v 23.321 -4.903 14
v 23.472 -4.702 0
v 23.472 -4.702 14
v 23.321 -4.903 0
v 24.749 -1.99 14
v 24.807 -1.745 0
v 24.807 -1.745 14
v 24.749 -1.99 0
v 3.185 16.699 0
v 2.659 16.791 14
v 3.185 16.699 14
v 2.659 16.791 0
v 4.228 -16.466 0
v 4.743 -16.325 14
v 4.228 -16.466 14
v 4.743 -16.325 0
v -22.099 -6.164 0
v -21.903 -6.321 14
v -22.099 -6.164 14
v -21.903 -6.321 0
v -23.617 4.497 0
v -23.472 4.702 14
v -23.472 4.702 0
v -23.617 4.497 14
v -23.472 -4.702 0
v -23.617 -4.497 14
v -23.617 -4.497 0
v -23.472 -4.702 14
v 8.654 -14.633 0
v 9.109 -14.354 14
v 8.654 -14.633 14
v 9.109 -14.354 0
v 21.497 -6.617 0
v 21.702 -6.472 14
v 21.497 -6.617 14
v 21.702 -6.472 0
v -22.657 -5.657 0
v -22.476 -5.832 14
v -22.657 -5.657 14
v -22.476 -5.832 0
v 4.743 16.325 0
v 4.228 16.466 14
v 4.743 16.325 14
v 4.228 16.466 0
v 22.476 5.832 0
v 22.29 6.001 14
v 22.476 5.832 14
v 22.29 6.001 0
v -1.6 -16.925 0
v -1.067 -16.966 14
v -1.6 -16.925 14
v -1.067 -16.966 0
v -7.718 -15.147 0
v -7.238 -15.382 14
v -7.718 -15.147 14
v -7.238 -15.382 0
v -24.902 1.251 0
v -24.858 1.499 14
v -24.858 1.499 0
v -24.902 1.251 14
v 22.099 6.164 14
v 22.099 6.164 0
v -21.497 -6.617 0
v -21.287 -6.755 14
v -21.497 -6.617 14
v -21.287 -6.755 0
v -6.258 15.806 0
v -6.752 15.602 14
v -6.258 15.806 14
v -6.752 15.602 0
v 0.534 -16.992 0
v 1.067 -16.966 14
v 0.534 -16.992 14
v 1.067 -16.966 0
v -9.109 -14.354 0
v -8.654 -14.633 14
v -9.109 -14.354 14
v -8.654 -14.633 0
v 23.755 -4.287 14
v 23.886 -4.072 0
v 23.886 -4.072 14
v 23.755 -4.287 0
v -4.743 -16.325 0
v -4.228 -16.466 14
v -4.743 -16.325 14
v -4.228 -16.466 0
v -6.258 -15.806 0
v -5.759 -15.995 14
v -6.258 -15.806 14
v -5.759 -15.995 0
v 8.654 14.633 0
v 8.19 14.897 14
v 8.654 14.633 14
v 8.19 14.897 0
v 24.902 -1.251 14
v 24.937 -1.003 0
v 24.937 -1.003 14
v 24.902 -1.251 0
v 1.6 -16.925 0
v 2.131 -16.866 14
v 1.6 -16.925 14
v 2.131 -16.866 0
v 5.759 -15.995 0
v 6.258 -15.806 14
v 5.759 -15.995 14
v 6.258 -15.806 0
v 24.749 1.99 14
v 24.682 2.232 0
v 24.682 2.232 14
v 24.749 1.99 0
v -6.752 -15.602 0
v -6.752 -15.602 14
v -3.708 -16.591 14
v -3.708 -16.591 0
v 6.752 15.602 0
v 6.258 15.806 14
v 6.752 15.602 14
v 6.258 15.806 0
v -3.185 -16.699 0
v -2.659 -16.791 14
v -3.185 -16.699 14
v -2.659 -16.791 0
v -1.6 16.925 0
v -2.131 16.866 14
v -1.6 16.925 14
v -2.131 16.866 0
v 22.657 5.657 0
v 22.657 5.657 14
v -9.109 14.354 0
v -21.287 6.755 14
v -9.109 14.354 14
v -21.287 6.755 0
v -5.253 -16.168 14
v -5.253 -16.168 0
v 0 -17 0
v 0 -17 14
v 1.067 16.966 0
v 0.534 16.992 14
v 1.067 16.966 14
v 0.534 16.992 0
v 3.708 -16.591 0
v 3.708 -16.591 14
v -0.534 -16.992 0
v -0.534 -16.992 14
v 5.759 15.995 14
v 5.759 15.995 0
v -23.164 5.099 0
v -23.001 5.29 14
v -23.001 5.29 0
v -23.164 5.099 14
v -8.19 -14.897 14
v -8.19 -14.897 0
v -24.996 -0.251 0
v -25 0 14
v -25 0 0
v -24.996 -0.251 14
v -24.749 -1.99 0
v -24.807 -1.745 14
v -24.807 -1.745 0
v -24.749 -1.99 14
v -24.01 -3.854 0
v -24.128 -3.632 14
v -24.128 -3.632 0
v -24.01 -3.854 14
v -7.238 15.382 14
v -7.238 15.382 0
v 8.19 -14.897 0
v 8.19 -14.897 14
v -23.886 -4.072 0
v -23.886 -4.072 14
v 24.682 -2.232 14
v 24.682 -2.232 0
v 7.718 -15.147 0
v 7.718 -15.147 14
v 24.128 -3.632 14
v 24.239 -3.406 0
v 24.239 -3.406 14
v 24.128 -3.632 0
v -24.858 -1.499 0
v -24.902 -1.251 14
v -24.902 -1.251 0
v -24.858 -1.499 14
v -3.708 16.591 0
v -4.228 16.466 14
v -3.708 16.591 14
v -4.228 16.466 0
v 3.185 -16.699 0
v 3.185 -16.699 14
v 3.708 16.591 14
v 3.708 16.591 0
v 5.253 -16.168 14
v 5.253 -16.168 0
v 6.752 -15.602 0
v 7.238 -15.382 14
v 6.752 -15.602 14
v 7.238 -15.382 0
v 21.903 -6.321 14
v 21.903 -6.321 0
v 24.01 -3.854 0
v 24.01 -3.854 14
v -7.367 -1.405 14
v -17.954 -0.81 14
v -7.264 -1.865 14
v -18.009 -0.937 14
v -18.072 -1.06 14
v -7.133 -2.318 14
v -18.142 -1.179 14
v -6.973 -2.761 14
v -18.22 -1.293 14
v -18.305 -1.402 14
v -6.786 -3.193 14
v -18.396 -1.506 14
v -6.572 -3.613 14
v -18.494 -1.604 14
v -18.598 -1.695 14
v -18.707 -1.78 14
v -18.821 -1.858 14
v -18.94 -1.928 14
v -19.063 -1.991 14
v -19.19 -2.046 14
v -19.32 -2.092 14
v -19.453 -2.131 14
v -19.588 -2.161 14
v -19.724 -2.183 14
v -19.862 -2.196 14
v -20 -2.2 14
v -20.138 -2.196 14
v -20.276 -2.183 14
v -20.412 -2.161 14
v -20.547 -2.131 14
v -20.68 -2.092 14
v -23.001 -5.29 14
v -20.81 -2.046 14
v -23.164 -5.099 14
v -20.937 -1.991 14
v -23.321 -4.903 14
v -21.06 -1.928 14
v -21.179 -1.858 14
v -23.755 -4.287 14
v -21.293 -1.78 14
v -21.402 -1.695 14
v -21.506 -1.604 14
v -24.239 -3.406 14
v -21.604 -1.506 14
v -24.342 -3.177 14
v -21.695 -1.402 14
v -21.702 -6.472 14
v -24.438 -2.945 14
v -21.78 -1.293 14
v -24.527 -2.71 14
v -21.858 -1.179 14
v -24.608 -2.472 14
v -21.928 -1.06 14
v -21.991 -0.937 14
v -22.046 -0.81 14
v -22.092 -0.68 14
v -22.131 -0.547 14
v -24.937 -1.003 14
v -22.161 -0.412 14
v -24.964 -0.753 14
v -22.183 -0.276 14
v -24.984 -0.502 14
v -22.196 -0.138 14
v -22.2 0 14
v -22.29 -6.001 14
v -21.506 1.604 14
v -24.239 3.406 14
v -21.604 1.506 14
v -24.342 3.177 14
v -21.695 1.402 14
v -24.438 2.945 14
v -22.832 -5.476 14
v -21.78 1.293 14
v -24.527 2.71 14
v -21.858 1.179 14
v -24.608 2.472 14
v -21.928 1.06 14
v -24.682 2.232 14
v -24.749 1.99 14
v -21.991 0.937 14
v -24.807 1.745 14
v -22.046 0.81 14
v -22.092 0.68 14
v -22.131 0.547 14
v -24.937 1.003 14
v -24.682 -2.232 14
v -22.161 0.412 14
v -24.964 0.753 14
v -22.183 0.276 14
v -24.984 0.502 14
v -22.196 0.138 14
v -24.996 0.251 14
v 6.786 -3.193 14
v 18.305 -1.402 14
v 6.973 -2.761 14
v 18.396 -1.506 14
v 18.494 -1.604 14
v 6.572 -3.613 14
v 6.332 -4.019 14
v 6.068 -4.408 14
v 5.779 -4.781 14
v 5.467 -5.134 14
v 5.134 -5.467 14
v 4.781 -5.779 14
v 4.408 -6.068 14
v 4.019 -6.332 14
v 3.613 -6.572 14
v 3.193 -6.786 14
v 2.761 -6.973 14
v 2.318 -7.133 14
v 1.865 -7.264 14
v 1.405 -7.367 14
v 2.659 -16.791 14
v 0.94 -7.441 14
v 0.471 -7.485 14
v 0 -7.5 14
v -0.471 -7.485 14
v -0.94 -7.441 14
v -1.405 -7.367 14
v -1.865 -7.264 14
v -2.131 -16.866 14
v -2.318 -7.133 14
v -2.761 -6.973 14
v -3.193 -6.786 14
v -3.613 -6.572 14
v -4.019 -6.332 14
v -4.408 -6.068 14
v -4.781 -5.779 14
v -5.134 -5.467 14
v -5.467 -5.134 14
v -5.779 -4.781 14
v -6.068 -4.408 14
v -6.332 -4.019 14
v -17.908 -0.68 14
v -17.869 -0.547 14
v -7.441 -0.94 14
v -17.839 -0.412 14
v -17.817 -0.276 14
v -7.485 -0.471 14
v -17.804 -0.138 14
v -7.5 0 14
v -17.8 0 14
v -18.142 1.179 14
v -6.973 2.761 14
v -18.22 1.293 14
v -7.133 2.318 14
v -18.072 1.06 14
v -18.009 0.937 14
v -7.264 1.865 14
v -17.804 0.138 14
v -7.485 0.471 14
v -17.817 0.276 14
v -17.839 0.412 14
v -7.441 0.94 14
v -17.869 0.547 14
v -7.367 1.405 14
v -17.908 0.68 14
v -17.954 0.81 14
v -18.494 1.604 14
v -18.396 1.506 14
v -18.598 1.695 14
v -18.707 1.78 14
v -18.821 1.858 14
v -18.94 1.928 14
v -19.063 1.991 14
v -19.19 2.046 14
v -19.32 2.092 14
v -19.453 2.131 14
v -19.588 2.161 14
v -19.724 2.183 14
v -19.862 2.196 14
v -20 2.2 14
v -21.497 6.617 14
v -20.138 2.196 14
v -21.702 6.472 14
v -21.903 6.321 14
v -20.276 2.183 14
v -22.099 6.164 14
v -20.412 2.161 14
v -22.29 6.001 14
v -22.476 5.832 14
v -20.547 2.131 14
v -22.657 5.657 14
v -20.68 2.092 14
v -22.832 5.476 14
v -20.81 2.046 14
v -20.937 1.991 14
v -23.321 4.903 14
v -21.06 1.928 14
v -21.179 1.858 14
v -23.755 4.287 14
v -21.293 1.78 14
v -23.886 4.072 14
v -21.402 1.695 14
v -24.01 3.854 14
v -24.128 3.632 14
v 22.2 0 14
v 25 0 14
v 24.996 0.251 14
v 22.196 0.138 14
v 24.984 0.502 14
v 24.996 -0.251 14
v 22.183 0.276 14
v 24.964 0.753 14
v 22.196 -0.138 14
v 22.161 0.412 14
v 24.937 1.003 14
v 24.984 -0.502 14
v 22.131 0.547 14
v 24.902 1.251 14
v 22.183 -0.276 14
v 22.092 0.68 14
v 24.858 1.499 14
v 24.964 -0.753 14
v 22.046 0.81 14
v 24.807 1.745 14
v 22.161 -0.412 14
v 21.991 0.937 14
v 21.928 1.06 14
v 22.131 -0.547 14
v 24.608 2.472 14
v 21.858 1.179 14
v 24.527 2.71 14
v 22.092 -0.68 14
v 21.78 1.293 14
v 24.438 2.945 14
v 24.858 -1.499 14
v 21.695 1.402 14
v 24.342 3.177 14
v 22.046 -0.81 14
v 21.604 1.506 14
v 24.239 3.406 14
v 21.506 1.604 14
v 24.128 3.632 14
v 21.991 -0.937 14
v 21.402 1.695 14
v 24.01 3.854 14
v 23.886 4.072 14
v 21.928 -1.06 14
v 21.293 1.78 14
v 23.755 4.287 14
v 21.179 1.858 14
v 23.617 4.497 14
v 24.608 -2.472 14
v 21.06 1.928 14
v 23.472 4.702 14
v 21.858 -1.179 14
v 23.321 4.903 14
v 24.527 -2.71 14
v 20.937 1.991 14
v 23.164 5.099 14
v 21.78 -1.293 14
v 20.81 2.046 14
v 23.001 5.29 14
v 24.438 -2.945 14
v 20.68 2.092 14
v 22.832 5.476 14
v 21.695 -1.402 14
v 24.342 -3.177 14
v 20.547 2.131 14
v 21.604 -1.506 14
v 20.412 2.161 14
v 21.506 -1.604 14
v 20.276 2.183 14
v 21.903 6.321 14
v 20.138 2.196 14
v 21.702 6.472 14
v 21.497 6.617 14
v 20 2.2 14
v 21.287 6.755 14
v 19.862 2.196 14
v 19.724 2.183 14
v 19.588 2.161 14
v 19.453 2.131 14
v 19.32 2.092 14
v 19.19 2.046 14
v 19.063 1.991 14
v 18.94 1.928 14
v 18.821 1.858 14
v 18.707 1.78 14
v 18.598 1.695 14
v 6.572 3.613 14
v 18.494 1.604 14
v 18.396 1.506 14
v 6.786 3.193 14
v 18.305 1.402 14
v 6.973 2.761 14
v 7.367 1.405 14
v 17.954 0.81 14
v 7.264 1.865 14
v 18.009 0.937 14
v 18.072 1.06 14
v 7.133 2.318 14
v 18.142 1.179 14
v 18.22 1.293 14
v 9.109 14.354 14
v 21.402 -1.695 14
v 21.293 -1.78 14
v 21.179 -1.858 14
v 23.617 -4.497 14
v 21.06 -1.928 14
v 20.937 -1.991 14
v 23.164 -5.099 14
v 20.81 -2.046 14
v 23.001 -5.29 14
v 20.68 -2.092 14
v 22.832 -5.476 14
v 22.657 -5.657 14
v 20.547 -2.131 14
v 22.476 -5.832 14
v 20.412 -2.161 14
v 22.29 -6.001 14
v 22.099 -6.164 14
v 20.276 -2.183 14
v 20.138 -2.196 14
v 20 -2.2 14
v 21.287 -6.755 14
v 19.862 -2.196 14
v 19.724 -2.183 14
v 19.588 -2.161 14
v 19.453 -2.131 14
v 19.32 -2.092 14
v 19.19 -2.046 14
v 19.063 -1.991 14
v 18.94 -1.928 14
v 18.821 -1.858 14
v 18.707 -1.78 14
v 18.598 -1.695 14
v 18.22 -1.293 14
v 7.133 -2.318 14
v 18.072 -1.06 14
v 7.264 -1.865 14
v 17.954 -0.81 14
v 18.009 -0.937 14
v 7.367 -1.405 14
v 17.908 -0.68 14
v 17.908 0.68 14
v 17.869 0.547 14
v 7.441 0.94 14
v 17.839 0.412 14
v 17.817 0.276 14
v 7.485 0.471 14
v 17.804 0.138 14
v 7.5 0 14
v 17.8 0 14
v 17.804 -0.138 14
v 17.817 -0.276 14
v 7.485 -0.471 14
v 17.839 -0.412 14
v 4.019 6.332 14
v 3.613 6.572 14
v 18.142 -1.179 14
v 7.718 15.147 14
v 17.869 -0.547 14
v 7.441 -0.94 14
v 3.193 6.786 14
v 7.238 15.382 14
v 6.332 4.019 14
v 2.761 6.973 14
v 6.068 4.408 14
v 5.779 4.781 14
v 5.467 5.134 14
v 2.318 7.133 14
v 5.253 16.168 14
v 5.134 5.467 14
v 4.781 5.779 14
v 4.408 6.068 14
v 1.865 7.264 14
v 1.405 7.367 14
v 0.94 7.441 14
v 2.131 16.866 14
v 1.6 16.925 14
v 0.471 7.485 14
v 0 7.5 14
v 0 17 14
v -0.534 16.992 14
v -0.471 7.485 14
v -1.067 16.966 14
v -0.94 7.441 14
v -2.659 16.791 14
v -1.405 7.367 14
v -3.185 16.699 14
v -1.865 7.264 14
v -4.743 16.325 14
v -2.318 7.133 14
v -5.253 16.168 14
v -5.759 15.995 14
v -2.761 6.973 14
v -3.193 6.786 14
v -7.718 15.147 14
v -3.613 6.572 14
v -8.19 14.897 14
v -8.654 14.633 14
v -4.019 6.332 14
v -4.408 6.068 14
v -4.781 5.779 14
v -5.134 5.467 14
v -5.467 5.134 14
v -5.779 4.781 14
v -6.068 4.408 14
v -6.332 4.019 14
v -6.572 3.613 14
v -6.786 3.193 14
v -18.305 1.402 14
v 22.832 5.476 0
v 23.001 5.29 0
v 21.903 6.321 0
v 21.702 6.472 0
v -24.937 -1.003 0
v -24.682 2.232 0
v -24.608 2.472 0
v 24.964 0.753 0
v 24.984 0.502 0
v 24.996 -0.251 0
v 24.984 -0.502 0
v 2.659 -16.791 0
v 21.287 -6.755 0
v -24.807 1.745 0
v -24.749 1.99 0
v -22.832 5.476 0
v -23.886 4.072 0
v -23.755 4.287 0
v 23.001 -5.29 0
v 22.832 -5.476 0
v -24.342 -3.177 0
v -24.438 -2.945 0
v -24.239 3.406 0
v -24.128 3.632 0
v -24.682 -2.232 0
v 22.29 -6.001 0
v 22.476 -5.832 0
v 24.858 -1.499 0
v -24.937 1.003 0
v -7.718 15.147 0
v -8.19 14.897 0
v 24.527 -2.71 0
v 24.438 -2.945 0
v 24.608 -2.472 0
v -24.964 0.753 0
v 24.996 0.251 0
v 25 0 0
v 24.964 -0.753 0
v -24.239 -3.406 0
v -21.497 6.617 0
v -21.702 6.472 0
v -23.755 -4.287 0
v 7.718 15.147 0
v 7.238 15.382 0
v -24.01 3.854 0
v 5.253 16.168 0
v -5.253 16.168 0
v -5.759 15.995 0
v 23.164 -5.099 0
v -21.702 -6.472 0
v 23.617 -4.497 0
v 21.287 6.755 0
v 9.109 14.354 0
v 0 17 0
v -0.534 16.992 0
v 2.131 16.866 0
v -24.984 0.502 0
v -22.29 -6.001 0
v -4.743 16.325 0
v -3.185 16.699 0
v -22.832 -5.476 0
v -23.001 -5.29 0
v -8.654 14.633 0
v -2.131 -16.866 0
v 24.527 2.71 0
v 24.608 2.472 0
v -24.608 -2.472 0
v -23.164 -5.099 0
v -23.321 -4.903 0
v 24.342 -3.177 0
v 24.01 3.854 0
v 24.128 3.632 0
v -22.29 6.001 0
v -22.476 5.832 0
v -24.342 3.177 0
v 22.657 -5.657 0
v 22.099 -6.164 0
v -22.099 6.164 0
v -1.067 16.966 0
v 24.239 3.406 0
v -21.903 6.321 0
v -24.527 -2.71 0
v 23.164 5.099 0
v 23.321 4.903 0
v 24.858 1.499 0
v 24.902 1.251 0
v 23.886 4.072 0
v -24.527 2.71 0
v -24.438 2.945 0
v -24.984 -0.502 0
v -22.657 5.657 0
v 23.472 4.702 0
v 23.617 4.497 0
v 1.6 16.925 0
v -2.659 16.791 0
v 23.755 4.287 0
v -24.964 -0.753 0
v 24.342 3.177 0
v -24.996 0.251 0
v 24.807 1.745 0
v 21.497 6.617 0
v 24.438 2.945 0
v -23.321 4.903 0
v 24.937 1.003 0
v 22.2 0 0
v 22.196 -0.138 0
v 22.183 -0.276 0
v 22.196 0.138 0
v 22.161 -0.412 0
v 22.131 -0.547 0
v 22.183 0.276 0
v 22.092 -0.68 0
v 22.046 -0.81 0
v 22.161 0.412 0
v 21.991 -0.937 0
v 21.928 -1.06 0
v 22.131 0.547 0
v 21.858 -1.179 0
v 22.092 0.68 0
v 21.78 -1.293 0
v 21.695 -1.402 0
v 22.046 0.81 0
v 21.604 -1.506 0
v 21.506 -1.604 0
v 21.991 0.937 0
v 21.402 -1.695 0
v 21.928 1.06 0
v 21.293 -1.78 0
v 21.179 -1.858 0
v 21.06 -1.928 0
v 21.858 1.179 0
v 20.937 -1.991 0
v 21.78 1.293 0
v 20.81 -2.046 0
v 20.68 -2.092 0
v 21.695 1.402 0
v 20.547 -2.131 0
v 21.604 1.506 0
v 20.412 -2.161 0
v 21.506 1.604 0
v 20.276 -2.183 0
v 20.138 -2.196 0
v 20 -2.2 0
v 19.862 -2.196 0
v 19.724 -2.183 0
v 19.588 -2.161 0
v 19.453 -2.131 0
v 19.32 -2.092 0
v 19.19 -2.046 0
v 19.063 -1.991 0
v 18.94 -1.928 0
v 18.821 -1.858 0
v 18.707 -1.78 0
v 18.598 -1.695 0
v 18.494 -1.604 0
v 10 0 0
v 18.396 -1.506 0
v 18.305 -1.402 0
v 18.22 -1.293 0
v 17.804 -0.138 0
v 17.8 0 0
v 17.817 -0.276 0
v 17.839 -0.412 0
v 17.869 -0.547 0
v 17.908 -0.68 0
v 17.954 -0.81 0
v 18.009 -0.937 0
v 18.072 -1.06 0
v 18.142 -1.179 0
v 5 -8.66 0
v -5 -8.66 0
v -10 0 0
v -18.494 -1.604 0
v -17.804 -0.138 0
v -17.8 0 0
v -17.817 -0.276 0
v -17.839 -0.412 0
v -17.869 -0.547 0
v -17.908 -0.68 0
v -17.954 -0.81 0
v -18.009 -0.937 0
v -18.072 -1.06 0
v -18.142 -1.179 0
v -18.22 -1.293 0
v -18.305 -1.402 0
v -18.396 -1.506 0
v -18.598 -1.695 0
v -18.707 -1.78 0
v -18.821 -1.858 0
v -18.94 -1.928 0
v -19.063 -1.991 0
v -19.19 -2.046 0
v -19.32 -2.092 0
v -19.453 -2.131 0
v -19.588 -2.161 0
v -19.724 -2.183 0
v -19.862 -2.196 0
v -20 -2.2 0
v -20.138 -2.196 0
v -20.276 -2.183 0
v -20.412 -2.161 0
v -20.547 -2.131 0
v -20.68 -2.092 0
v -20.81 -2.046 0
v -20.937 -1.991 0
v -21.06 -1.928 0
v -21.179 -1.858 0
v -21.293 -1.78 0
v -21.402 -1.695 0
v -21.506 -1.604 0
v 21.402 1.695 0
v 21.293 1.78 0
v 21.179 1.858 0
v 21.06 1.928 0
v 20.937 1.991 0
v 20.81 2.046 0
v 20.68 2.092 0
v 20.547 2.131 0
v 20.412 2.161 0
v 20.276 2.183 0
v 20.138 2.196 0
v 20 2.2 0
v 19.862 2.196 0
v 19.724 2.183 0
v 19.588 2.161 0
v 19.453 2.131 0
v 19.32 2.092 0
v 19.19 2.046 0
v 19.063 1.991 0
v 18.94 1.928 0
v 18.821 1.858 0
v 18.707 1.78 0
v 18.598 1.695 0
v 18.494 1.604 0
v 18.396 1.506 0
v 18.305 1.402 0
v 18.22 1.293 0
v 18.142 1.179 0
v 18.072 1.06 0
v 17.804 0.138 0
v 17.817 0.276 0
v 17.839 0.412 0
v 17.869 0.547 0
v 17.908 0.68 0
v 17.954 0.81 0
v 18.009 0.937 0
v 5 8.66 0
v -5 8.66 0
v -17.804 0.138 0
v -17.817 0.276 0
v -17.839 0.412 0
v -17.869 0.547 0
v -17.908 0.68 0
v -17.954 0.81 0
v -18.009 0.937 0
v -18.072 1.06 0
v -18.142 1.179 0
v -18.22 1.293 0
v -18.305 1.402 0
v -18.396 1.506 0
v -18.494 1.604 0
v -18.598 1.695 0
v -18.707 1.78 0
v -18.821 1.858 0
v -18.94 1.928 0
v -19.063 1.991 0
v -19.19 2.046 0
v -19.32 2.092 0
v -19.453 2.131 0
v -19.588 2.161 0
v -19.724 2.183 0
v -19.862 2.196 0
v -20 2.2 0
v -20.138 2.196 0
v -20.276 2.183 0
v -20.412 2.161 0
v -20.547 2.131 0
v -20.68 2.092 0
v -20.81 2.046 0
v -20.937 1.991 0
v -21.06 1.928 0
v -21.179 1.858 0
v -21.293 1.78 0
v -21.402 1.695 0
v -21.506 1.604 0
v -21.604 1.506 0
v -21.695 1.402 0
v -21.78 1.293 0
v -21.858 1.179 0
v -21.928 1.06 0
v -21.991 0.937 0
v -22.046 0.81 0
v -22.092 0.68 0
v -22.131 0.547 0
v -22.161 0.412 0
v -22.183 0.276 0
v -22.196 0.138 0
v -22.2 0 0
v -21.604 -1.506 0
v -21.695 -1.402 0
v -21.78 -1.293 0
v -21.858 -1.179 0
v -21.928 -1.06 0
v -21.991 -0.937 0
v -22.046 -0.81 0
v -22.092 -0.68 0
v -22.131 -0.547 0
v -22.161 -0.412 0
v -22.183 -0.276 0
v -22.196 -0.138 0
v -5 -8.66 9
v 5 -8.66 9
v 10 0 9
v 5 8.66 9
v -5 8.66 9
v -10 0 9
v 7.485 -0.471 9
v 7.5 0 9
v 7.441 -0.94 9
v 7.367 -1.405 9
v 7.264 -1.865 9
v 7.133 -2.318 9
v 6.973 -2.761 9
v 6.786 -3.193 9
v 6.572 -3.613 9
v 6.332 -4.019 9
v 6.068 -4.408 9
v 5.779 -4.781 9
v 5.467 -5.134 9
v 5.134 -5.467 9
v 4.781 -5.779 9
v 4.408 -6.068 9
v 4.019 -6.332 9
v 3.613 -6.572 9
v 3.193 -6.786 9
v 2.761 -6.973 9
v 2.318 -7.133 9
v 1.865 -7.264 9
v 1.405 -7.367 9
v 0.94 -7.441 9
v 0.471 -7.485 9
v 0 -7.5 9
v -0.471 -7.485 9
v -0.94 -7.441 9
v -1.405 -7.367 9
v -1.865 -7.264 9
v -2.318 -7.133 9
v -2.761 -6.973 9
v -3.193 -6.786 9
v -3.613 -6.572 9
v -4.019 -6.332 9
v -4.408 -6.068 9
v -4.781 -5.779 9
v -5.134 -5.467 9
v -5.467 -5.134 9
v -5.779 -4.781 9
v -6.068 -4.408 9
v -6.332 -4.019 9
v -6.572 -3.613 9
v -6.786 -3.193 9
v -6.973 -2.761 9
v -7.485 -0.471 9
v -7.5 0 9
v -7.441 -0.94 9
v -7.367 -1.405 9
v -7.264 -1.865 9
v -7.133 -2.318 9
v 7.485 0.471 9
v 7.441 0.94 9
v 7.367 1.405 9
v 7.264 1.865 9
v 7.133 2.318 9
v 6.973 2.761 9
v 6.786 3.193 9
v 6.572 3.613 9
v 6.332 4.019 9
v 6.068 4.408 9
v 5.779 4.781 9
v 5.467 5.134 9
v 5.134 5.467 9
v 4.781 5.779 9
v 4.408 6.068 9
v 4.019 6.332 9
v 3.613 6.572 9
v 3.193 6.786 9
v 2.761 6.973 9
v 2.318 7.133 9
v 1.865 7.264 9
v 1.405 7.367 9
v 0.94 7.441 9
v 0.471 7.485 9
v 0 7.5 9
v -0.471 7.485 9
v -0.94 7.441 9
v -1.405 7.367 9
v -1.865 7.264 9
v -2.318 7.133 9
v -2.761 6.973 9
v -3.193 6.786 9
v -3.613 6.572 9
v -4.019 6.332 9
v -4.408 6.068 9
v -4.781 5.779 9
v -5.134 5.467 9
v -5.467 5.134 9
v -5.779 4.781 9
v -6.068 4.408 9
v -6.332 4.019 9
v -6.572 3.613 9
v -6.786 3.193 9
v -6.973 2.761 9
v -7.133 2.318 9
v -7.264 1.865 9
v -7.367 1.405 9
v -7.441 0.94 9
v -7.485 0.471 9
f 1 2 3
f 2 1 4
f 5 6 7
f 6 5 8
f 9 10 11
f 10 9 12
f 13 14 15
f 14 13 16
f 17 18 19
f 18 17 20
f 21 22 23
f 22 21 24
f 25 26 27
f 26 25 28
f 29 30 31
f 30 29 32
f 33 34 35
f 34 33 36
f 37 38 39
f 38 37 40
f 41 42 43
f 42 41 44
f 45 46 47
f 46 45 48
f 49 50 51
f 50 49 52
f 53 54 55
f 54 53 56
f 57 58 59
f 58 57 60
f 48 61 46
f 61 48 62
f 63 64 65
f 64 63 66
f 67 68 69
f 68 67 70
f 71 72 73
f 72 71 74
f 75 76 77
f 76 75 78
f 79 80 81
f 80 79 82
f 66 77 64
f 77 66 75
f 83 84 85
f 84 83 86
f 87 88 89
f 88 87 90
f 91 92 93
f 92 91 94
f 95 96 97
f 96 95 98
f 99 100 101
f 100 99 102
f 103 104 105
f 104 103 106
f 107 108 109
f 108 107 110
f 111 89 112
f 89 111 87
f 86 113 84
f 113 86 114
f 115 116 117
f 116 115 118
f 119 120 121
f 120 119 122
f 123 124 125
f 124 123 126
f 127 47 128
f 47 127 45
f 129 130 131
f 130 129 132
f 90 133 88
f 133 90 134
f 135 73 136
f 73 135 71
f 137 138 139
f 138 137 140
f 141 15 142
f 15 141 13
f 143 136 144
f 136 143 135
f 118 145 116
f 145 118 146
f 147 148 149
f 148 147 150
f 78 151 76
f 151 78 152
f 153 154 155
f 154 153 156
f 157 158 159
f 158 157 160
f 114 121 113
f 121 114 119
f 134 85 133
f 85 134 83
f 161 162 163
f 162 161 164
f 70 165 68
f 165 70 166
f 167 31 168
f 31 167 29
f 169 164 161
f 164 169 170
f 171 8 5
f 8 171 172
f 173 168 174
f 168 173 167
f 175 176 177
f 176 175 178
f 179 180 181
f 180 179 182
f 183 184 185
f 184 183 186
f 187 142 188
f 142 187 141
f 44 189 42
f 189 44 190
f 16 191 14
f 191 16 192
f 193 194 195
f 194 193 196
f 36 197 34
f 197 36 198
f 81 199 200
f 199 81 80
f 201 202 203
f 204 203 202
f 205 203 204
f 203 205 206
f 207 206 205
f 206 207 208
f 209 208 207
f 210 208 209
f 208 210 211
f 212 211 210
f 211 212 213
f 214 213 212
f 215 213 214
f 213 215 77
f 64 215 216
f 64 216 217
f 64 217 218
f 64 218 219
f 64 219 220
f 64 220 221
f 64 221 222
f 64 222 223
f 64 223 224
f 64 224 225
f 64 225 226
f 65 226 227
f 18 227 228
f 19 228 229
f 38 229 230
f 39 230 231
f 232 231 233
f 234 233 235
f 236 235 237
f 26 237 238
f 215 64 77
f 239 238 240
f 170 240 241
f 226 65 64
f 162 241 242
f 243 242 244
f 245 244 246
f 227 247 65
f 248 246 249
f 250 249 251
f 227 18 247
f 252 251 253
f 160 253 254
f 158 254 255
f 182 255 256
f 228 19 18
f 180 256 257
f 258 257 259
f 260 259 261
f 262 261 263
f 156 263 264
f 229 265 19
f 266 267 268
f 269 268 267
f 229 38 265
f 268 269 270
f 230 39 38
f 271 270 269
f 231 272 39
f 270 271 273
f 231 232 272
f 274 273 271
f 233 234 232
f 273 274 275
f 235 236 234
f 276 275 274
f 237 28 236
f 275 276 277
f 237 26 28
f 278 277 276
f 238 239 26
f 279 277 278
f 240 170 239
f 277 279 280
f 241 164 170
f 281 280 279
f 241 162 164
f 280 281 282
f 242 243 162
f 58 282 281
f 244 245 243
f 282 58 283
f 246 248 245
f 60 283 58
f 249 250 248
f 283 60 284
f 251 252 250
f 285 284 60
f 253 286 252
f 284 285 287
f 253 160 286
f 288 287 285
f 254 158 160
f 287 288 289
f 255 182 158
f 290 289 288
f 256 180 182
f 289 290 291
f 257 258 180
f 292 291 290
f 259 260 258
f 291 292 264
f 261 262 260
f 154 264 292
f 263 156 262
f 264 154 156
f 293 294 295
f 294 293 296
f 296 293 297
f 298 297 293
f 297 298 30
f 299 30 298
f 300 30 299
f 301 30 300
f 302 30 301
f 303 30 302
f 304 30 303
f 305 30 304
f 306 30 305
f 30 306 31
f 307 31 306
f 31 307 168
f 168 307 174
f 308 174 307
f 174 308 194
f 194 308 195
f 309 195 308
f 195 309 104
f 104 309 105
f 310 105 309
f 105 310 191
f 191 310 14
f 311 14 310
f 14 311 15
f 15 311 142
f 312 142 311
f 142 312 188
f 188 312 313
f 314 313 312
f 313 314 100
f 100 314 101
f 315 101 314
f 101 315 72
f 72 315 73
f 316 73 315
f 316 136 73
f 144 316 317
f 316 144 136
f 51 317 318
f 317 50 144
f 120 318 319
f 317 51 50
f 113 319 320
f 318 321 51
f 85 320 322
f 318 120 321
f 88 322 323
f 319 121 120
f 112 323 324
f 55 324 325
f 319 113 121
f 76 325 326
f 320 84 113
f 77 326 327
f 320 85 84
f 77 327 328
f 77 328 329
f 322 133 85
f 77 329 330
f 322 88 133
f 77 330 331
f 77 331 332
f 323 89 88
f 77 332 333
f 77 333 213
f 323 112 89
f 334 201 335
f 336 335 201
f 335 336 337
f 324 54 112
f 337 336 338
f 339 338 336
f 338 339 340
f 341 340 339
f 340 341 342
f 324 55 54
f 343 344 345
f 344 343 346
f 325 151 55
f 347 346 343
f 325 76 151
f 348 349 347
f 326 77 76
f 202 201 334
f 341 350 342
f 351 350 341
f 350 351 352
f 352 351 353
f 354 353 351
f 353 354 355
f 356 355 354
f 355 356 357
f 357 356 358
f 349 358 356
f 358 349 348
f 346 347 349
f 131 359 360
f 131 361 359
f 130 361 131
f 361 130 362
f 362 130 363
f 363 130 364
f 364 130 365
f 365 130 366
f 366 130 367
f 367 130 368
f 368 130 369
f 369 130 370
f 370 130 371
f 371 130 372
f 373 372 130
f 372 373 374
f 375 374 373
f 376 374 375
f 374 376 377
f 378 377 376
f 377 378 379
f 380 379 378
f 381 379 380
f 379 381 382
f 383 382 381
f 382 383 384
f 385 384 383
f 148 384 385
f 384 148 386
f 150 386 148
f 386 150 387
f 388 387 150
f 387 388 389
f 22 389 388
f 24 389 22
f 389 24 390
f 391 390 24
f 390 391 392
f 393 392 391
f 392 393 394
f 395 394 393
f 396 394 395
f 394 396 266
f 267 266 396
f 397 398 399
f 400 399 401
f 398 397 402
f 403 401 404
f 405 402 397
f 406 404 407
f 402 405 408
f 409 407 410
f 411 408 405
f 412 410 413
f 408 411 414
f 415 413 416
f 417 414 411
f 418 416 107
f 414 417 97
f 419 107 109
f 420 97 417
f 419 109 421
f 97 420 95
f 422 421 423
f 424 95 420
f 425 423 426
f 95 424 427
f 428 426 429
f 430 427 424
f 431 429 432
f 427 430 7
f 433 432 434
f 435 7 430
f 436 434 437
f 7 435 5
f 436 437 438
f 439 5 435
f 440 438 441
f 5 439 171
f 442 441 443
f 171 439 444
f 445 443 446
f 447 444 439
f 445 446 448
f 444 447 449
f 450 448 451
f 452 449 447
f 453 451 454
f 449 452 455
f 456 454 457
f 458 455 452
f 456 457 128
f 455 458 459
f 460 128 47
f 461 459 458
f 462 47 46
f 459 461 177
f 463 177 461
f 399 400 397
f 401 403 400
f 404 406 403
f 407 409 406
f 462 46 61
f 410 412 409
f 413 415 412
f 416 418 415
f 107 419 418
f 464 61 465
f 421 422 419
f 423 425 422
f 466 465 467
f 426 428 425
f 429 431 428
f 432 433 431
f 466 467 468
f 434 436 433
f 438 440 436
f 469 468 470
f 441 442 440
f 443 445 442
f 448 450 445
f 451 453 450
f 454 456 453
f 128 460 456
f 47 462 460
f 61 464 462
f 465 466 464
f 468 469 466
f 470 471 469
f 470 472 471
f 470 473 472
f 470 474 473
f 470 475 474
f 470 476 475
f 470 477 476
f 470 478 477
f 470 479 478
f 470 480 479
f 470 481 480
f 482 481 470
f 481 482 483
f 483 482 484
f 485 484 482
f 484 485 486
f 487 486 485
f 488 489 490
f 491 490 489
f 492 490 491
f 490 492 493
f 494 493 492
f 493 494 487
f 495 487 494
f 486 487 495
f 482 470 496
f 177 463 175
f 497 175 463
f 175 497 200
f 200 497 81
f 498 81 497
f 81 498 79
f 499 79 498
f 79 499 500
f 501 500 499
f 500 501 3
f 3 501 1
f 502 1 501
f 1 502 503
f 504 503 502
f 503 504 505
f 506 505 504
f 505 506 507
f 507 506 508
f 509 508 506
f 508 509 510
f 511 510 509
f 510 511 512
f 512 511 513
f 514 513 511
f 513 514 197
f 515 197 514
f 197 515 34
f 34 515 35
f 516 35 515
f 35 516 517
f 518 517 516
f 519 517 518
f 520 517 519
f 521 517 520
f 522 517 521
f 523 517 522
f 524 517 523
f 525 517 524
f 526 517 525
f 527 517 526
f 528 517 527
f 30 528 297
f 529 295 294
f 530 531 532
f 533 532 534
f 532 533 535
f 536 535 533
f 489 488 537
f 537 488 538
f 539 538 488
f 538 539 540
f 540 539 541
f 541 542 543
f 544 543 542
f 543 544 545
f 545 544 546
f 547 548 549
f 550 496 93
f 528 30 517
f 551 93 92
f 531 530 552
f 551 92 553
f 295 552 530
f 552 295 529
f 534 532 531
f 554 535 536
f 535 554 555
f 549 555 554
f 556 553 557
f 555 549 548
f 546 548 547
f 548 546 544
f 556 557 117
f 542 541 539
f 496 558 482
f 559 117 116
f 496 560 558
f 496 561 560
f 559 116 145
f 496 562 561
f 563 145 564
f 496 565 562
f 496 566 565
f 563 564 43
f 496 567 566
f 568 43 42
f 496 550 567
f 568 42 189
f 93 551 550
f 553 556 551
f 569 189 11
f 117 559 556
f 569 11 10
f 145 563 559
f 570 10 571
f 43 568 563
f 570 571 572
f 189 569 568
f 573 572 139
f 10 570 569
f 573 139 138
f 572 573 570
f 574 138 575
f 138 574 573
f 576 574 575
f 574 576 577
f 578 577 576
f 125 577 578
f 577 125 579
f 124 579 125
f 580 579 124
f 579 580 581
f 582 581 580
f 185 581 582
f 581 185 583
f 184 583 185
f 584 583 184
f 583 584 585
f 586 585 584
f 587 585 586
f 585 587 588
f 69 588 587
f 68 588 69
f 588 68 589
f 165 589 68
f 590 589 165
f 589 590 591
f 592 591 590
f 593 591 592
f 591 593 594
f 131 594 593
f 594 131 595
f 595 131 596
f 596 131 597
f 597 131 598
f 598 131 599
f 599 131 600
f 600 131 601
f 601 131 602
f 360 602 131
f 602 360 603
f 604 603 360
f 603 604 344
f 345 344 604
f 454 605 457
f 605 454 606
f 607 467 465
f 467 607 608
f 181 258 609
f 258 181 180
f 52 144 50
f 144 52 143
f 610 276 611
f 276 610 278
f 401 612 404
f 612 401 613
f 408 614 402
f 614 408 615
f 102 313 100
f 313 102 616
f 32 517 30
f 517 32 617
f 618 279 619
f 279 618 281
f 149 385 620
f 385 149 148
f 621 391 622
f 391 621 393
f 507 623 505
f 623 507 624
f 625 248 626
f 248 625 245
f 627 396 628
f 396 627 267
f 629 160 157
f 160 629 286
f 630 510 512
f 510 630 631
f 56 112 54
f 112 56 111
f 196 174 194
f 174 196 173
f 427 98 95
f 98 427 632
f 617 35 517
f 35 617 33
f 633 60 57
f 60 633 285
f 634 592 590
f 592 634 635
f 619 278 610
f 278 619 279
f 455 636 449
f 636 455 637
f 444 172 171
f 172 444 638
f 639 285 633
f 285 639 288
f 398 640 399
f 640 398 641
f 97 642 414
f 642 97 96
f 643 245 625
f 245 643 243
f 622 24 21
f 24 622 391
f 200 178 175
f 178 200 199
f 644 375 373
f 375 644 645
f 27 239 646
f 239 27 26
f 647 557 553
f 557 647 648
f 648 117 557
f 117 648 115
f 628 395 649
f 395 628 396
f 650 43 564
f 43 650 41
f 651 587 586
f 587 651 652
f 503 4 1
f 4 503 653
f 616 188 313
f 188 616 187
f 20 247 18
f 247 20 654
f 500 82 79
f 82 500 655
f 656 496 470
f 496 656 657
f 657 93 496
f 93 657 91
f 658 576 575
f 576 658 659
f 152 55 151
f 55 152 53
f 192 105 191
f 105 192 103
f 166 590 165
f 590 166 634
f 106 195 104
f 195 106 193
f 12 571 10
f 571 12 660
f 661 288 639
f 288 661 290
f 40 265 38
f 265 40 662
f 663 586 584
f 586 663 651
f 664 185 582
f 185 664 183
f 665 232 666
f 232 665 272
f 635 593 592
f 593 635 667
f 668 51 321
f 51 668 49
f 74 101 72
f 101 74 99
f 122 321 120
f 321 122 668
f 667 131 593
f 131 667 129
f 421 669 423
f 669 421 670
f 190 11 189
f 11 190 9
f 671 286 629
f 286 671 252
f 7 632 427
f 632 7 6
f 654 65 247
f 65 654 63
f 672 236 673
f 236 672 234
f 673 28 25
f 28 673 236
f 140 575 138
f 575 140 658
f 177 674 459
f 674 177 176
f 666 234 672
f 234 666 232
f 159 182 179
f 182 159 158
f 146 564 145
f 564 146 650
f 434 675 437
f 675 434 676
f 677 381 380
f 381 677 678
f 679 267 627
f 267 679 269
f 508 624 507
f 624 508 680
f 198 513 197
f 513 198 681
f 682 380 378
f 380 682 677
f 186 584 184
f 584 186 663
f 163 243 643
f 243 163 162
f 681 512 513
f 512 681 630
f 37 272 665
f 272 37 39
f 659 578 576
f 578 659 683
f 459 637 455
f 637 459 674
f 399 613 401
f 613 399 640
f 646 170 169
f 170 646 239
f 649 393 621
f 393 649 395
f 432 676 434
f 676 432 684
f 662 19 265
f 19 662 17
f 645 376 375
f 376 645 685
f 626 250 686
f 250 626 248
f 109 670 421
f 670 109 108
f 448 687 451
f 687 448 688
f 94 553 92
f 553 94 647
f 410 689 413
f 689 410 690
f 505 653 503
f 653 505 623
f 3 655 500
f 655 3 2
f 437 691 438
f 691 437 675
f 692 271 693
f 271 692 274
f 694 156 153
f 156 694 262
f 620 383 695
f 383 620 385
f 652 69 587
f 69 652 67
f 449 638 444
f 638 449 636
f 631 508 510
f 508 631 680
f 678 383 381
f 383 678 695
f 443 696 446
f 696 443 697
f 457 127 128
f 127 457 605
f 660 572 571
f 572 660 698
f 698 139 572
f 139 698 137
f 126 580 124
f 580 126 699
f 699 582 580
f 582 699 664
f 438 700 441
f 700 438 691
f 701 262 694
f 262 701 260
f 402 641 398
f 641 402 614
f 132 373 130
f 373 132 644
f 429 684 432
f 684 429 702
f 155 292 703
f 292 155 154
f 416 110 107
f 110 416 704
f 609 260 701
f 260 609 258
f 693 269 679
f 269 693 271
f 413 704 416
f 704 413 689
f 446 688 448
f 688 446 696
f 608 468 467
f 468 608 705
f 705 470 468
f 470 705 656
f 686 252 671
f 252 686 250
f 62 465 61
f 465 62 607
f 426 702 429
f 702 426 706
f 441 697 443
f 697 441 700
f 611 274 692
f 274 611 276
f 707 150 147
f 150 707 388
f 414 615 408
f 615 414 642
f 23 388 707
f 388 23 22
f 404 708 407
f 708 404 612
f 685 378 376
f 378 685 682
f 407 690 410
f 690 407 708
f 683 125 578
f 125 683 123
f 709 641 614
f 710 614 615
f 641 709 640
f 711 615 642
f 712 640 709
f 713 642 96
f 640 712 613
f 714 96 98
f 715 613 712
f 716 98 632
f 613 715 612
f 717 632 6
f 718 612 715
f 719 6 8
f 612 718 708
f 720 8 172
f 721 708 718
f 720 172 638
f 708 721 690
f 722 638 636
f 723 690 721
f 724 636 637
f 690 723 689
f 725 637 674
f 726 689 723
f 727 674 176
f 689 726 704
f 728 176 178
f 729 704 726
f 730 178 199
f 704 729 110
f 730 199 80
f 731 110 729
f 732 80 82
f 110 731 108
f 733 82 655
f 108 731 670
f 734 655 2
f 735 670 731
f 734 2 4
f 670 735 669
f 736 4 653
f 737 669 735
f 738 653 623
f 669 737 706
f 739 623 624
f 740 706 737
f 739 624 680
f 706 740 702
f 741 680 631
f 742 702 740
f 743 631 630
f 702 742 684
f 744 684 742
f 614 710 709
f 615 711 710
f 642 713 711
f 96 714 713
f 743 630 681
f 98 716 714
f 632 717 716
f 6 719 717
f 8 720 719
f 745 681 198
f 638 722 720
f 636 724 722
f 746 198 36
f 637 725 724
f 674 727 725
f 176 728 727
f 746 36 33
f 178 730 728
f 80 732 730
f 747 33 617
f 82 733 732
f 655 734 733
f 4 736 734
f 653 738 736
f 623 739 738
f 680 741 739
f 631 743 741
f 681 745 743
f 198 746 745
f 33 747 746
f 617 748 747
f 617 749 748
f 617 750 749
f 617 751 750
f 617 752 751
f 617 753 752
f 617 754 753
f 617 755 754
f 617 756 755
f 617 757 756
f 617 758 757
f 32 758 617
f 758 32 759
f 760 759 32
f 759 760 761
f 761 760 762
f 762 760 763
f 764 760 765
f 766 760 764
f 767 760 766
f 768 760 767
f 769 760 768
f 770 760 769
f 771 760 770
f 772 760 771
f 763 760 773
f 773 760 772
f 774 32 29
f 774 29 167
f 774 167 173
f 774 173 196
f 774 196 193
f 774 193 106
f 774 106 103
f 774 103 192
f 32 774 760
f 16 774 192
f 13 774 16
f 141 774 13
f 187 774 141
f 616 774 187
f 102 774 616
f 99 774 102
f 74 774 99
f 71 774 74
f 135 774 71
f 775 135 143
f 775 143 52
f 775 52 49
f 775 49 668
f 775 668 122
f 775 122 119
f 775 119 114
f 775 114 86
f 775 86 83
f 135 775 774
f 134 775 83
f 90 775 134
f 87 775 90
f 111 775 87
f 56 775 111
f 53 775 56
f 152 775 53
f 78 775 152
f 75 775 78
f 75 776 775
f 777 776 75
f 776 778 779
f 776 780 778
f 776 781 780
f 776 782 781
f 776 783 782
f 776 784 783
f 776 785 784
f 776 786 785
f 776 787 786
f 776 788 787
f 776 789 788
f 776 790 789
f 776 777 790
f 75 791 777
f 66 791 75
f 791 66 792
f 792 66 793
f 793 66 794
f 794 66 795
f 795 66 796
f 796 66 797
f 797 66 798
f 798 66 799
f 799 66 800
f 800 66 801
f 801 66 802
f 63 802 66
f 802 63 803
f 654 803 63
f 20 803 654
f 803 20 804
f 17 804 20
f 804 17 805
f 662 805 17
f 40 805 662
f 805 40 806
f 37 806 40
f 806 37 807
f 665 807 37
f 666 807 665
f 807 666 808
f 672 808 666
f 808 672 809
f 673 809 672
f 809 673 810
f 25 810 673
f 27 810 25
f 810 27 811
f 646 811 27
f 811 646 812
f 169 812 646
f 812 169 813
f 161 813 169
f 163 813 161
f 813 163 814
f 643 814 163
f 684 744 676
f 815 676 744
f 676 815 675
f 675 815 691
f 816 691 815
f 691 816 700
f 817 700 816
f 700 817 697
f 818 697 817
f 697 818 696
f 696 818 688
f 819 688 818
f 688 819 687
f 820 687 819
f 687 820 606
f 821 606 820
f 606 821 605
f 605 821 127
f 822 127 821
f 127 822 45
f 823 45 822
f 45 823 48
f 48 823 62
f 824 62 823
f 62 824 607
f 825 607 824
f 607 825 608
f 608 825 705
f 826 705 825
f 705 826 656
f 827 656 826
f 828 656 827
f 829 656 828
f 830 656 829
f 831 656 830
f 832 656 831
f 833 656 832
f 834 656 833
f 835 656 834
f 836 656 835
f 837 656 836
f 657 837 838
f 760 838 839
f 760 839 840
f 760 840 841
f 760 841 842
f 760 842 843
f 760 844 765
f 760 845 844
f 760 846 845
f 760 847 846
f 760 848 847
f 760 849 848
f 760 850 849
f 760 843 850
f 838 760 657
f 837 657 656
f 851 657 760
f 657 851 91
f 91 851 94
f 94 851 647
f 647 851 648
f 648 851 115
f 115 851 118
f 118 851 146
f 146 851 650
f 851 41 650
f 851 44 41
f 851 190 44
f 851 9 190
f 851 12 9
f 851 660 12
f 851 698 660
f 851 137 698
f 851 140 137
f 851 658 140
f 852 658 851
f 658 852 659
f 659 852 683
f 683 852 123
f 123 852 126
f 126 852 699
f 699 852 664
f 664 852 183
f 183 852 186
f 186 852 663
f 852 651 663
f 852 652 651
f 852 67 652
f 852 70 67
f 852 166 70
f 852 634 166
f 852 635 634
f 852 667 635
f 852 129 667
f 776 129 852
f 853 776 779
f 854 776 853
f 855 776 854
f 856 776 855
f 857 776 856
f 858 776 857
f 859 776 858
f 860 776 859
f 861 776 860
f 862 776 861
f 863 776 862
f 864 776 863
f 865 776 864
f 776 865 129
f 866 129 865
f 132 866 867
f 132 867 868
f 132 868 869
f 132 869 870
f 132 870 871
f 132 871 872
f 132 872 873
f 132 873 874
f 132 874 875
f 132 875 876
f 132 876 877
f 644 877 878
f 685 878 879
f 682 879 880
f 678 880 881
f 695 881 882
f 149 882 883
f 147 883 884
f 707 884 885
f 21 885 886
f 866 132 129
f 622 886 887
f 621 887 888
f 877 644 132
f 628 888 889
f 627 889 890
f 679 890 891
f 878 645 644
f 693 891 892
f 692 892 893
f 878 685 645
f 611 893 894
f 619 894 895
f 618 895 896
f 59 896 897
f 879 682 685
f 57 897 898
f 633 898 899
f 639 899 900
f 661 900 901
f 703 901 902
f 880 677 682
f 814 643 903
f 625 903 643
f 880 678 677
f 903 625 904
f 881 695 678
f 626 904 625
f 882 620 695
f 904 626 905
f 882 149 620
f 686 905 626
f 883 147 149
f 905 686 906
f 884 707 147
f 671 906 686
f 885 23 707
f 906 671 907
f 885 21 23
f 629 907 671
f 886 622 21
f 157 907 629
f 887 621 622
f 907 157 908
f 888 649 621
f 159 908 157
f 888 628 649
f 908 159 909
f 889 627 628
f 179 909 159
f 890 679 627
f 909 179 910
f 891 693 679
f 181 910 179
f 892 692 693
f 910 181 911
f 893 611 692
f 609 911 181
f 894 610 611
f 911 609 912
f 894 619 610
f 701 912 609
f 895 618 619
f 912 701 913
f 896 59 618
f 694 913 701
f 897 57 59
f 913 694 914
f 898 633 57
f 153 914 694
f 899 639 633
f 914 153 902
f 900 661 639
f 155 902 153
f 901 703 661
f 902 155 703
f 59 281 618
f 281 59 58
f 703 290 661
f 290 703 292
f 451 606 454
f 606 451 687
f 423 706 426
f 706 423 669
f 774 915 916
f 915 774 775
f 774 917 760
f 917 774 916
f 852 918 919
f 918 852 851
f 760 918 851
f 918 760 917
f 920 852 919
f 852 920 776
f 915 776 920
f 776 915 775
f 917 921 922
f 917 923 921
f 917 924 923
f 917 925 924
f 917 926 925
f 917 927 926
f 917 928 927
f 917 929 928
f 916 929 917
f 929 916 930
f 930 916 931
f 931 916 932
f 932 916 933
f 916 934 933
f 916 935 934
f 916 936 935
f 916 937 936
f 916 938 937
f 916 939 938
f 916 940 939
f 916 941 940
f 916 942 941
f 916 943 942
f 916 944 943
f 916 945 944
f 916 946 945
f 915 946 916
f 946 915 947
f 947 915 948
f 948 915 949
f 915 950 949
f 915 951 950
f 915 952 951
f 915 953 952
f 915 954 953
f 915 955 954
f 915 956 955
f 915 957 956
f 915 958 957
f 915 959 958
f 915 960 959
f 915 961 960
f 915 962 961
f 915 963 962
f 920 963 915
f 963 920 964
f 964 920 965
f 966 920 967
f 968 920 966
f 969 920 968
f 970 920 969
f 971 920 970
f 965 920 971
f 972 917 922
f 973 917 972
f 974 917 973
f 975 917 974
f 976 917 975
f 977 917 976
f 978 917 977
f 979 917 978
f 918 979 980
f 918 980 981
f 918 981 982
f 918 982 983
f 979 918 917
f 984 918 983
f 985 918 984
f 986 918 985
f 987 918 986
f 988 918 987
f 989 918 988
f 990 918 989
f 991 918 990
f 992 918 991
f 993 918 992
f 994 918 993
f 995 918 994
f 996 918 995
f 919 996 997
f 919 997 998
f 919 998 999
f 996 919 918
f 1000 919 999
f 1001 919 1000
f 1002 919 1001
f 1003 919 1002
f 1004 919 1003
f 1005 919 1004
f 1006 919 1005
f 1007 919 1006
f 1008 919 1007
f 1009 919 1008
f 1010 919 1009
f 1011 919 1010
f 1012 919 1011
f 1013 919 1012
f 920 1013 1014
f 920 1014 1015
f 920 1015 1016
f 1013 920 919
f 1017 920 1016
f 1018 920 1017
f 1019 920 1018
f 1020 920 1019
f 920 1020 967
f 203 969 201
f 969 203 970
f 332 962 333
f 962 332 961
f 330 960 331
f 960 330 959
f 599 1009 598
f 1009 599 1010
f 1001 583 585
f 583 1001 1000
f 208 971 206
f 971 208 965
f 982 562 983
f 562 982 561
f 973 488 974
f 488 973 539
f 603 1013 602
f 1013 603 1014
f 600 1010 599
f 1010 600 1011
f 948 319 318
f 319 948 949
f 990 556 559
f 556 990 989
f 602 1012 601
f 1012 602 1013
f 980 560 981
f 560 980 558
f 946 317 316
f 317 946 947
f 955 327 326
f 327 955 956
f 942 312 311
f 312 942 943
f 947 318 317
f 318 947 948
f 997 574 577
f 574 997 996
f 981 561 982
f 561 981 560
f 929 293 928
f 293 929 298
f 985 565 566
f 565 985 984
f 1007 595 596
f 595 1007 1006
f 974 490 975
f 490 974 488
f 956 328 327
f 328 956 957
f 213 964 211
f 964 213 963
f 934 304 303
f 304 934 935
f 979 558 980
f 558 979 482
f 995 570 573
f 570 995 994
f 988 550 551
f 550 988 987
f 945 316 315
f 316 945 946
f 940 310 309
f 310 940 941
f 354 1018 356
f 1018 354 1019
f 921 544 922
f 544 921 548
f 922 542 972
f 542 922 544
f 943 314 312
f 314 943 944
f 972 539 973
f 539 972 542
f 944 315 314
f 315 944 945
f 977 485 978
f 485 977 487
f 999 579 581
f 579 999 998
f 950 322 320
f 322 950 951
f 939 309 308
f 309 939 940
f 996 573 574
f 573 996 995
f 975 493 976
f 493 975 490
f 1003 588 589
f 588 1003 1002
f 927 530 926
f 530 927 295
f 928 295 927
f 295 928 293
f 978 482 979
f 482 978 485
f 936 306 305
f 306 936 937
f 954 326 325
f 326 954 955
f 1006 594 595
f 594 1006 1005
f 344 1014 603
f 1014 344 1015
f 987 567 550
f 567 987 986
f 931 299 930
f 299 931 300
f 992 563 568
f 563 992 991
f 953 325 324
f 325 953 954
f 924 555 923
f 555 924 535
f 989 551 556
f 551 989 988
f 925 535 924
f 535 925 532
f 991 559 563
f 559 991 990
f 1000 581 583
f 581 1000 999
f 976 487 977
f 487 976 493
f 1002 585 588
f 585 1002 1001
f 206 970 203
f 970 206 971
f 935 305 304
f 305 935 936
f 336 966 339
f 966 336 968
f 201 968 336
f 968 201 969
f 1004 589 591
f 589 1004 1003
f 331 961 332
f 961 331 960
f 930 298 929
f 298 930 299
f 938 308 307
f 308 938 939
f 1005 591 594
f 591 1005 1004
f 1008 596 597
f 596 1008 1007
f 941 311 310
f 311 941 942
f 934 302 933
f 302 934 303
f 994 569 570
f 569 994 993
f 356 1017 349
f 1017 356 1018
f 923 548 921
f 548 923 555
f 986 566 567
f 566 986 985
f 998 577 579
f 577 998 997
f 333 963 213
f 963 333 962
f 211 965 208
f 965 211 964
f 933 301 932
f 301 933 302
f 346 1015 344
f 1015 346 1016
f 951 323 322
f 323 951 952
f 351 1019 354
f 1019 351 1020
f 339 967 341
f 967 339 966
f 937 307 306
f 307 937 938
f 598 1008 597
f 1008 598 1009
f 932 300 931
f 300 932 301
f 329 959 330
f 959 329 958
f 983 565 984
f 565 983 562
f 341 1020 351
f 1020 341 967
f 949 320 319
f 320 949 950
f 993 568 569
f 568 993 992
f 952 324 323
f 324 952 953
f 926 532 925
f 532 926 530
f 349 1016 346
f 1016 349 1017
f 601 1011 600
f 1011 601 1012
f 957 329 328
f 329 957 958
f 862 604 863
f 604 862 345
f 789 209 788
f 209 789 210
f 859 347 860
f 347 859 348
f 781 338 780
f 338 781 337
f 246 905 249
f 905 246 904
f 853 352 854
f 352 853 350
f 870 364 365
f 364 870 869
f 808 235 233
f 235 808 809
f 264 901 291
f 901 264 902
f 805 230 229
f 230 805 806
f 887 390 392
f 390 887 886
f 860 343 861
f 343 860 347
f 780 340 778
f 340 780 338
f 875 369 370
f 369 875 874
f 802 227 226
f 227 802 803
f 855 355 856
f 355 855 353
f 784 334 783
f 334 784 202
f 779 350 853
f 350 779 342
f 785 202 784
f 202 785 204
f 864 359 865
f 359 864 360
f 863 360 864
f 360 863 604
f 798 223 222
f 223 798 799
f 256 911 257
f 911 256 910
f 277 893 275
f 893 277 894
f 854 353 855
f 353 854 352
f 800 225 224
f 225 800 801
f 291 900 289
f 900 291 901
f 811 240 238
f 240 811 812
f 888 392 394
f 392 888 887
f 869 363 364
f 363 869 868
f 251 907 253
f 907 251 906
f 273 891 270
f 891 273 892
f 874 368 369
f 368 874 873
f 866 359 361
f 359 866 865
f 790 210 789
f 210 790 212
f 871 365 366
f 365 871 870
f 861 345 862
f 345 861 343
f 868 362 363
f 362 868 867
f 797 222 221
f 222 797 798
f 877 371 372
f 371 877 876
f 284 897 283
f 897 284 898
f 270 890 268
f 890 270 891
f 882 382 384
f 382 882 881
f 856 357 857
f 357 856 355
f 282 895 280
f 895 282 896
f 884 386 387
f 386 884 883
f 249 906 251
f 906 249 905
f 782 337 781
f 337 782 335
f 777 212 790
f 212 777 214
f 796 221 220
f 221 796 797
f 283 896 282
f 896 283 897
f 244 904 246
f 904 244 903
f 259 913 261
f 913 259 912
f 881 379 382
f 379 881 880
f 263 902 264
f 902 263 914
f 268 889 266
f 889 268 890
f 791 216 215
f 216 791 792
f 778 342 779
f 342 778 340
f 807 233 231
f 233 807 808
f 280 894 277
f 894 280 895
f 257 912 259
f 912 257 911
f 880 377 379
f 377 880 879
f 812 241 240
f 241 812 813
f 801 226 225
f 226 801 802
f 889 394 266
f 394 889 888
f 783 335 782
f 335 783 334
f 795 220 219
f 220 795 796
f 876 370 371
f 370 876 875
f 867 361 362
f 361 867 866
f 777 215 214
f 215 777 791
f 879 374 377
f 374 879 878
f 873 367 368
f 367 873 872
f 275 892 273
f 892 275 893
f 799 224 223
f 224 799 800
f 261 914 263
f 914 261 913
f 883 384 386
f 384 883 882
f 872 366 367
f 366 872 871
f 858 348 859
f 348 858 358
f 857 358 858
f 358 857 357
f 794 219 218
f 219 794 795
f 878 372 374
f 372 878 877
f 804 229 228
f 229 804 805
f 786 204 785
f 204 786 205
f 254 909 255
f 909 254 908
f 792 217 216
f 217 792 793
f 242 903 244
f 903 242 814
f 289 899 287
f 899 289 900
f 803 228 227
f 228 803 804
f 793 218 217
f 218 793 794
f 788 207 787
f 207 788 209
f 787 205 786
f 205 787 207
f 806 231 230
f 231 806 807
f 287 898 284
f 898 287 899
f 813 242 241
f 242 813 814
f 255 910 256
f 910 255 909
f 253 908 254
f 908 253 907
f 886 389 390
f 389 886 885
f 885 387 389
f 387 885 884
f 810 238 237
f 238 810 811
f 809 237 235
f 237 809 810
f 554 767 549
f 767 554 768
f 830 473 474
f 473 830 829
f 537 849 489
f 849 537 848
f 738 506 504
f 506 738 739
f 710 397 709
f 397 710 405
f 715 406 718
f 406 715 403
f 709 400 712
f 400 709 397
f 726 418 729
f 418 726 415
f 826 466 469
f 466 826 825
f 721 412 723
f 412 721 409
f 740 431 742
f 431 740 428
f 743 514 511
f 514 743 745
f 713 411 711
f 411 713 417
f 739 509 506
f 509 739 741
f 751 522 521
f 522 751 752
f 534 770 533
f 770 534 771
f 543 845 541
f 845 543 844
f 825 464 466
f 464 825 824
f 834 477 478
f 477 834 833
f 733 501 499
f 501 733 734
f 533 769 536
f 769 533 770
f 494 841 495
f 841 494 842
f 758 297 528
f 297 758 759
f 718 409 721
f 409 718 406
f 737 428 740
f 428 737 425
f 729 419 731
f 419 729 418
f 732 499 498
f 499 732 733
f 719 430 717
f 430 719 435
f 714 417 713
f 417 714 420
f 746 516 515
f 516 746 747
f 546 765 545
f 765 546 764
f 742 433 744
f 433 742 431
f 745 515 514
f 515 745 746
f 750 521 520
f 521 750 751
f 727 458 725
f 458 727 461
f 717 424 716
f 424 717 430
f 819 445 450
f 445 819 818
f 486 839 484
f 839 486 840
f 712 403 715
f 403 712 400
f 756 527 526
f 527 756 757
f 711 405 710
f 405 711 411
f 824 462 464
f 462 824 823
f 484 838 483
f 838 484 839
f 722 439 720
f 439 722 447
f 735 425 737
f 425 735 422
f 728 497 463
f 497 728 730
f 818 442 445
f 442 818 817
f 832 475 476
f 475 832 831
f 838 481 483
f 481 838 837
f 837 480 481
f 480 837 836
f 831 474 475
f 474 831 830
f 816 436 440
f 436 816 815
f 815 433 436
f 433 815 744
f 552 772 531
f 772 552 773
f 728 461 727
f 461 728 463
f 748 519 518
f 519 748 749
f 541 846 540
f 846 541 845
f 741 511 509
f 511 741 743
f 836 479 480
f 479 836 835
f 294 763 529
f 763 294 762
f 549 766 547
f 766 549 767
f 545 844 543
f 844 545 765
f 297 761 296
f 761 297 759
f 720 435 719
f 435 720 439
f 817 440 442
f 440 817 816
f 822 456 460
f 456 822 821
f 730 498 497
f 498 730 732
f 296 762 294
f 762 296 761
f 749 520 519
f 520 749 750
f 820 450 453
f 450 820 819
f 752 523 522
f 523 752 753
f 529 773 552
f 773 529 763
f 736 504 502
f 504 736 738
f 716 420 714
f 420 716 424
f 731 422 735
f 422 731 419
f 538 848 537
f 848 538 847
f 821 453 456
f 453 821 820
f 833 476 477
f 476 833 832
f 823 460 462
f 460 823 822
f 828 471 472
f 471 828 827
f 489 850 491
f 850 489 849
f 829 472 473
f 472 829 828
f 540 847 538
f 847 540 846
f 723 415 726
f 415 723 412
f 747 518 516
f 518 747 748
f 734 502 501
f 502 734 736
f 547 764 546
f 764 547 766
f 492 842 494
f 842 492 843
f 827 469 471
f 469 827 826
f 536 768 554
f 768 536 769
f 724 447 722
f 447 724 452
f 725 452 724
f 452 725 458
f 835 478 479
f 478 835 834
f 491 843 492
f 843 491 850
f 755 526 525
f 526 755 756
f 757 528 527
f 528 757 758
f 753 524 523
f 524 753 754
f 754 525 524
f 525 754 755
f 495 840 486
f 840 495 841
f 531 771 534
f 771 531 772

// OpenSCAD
r_ecrou_m10=10;
r_m10=5.5;
h_ecrou_m10=9;
r_m4=2.2;
r_ens=17;

module porte_ecrou(){
	difference(){
		hull(){
			cylinder(r=r_ens, h=h_ecrou_m10+5, $fn=200);
			translate([-r_ens,0,0]){cylinder(r=8, h=h_ecrou_m10+5, $fn=200);}
			translate([r_ens,0,0]){cylinder(r=8, h=h_ecrou_m10+5, $fn=200);}
		}
		translate([0,0,-5]){cylinder(r=r_ecrou_m10, h=h_ecrou_m10+5, $fn=6);}
		translate([0,0,-5]){cylinder(r=r_m10+2, h=h_ecrou_m10+15+5, $fn=100);}

		translate([-r_ens-8+5,0,-5]){cylinder(r=r_m4, h=h_ecrou_m10+20, $fn=100);}
		translate([r_ens+8-5,0,-5]){cylinder(r=r_m4, h=h_ecrou_m10+20, $fn=100);}
	}

}

porte_ecrou();
